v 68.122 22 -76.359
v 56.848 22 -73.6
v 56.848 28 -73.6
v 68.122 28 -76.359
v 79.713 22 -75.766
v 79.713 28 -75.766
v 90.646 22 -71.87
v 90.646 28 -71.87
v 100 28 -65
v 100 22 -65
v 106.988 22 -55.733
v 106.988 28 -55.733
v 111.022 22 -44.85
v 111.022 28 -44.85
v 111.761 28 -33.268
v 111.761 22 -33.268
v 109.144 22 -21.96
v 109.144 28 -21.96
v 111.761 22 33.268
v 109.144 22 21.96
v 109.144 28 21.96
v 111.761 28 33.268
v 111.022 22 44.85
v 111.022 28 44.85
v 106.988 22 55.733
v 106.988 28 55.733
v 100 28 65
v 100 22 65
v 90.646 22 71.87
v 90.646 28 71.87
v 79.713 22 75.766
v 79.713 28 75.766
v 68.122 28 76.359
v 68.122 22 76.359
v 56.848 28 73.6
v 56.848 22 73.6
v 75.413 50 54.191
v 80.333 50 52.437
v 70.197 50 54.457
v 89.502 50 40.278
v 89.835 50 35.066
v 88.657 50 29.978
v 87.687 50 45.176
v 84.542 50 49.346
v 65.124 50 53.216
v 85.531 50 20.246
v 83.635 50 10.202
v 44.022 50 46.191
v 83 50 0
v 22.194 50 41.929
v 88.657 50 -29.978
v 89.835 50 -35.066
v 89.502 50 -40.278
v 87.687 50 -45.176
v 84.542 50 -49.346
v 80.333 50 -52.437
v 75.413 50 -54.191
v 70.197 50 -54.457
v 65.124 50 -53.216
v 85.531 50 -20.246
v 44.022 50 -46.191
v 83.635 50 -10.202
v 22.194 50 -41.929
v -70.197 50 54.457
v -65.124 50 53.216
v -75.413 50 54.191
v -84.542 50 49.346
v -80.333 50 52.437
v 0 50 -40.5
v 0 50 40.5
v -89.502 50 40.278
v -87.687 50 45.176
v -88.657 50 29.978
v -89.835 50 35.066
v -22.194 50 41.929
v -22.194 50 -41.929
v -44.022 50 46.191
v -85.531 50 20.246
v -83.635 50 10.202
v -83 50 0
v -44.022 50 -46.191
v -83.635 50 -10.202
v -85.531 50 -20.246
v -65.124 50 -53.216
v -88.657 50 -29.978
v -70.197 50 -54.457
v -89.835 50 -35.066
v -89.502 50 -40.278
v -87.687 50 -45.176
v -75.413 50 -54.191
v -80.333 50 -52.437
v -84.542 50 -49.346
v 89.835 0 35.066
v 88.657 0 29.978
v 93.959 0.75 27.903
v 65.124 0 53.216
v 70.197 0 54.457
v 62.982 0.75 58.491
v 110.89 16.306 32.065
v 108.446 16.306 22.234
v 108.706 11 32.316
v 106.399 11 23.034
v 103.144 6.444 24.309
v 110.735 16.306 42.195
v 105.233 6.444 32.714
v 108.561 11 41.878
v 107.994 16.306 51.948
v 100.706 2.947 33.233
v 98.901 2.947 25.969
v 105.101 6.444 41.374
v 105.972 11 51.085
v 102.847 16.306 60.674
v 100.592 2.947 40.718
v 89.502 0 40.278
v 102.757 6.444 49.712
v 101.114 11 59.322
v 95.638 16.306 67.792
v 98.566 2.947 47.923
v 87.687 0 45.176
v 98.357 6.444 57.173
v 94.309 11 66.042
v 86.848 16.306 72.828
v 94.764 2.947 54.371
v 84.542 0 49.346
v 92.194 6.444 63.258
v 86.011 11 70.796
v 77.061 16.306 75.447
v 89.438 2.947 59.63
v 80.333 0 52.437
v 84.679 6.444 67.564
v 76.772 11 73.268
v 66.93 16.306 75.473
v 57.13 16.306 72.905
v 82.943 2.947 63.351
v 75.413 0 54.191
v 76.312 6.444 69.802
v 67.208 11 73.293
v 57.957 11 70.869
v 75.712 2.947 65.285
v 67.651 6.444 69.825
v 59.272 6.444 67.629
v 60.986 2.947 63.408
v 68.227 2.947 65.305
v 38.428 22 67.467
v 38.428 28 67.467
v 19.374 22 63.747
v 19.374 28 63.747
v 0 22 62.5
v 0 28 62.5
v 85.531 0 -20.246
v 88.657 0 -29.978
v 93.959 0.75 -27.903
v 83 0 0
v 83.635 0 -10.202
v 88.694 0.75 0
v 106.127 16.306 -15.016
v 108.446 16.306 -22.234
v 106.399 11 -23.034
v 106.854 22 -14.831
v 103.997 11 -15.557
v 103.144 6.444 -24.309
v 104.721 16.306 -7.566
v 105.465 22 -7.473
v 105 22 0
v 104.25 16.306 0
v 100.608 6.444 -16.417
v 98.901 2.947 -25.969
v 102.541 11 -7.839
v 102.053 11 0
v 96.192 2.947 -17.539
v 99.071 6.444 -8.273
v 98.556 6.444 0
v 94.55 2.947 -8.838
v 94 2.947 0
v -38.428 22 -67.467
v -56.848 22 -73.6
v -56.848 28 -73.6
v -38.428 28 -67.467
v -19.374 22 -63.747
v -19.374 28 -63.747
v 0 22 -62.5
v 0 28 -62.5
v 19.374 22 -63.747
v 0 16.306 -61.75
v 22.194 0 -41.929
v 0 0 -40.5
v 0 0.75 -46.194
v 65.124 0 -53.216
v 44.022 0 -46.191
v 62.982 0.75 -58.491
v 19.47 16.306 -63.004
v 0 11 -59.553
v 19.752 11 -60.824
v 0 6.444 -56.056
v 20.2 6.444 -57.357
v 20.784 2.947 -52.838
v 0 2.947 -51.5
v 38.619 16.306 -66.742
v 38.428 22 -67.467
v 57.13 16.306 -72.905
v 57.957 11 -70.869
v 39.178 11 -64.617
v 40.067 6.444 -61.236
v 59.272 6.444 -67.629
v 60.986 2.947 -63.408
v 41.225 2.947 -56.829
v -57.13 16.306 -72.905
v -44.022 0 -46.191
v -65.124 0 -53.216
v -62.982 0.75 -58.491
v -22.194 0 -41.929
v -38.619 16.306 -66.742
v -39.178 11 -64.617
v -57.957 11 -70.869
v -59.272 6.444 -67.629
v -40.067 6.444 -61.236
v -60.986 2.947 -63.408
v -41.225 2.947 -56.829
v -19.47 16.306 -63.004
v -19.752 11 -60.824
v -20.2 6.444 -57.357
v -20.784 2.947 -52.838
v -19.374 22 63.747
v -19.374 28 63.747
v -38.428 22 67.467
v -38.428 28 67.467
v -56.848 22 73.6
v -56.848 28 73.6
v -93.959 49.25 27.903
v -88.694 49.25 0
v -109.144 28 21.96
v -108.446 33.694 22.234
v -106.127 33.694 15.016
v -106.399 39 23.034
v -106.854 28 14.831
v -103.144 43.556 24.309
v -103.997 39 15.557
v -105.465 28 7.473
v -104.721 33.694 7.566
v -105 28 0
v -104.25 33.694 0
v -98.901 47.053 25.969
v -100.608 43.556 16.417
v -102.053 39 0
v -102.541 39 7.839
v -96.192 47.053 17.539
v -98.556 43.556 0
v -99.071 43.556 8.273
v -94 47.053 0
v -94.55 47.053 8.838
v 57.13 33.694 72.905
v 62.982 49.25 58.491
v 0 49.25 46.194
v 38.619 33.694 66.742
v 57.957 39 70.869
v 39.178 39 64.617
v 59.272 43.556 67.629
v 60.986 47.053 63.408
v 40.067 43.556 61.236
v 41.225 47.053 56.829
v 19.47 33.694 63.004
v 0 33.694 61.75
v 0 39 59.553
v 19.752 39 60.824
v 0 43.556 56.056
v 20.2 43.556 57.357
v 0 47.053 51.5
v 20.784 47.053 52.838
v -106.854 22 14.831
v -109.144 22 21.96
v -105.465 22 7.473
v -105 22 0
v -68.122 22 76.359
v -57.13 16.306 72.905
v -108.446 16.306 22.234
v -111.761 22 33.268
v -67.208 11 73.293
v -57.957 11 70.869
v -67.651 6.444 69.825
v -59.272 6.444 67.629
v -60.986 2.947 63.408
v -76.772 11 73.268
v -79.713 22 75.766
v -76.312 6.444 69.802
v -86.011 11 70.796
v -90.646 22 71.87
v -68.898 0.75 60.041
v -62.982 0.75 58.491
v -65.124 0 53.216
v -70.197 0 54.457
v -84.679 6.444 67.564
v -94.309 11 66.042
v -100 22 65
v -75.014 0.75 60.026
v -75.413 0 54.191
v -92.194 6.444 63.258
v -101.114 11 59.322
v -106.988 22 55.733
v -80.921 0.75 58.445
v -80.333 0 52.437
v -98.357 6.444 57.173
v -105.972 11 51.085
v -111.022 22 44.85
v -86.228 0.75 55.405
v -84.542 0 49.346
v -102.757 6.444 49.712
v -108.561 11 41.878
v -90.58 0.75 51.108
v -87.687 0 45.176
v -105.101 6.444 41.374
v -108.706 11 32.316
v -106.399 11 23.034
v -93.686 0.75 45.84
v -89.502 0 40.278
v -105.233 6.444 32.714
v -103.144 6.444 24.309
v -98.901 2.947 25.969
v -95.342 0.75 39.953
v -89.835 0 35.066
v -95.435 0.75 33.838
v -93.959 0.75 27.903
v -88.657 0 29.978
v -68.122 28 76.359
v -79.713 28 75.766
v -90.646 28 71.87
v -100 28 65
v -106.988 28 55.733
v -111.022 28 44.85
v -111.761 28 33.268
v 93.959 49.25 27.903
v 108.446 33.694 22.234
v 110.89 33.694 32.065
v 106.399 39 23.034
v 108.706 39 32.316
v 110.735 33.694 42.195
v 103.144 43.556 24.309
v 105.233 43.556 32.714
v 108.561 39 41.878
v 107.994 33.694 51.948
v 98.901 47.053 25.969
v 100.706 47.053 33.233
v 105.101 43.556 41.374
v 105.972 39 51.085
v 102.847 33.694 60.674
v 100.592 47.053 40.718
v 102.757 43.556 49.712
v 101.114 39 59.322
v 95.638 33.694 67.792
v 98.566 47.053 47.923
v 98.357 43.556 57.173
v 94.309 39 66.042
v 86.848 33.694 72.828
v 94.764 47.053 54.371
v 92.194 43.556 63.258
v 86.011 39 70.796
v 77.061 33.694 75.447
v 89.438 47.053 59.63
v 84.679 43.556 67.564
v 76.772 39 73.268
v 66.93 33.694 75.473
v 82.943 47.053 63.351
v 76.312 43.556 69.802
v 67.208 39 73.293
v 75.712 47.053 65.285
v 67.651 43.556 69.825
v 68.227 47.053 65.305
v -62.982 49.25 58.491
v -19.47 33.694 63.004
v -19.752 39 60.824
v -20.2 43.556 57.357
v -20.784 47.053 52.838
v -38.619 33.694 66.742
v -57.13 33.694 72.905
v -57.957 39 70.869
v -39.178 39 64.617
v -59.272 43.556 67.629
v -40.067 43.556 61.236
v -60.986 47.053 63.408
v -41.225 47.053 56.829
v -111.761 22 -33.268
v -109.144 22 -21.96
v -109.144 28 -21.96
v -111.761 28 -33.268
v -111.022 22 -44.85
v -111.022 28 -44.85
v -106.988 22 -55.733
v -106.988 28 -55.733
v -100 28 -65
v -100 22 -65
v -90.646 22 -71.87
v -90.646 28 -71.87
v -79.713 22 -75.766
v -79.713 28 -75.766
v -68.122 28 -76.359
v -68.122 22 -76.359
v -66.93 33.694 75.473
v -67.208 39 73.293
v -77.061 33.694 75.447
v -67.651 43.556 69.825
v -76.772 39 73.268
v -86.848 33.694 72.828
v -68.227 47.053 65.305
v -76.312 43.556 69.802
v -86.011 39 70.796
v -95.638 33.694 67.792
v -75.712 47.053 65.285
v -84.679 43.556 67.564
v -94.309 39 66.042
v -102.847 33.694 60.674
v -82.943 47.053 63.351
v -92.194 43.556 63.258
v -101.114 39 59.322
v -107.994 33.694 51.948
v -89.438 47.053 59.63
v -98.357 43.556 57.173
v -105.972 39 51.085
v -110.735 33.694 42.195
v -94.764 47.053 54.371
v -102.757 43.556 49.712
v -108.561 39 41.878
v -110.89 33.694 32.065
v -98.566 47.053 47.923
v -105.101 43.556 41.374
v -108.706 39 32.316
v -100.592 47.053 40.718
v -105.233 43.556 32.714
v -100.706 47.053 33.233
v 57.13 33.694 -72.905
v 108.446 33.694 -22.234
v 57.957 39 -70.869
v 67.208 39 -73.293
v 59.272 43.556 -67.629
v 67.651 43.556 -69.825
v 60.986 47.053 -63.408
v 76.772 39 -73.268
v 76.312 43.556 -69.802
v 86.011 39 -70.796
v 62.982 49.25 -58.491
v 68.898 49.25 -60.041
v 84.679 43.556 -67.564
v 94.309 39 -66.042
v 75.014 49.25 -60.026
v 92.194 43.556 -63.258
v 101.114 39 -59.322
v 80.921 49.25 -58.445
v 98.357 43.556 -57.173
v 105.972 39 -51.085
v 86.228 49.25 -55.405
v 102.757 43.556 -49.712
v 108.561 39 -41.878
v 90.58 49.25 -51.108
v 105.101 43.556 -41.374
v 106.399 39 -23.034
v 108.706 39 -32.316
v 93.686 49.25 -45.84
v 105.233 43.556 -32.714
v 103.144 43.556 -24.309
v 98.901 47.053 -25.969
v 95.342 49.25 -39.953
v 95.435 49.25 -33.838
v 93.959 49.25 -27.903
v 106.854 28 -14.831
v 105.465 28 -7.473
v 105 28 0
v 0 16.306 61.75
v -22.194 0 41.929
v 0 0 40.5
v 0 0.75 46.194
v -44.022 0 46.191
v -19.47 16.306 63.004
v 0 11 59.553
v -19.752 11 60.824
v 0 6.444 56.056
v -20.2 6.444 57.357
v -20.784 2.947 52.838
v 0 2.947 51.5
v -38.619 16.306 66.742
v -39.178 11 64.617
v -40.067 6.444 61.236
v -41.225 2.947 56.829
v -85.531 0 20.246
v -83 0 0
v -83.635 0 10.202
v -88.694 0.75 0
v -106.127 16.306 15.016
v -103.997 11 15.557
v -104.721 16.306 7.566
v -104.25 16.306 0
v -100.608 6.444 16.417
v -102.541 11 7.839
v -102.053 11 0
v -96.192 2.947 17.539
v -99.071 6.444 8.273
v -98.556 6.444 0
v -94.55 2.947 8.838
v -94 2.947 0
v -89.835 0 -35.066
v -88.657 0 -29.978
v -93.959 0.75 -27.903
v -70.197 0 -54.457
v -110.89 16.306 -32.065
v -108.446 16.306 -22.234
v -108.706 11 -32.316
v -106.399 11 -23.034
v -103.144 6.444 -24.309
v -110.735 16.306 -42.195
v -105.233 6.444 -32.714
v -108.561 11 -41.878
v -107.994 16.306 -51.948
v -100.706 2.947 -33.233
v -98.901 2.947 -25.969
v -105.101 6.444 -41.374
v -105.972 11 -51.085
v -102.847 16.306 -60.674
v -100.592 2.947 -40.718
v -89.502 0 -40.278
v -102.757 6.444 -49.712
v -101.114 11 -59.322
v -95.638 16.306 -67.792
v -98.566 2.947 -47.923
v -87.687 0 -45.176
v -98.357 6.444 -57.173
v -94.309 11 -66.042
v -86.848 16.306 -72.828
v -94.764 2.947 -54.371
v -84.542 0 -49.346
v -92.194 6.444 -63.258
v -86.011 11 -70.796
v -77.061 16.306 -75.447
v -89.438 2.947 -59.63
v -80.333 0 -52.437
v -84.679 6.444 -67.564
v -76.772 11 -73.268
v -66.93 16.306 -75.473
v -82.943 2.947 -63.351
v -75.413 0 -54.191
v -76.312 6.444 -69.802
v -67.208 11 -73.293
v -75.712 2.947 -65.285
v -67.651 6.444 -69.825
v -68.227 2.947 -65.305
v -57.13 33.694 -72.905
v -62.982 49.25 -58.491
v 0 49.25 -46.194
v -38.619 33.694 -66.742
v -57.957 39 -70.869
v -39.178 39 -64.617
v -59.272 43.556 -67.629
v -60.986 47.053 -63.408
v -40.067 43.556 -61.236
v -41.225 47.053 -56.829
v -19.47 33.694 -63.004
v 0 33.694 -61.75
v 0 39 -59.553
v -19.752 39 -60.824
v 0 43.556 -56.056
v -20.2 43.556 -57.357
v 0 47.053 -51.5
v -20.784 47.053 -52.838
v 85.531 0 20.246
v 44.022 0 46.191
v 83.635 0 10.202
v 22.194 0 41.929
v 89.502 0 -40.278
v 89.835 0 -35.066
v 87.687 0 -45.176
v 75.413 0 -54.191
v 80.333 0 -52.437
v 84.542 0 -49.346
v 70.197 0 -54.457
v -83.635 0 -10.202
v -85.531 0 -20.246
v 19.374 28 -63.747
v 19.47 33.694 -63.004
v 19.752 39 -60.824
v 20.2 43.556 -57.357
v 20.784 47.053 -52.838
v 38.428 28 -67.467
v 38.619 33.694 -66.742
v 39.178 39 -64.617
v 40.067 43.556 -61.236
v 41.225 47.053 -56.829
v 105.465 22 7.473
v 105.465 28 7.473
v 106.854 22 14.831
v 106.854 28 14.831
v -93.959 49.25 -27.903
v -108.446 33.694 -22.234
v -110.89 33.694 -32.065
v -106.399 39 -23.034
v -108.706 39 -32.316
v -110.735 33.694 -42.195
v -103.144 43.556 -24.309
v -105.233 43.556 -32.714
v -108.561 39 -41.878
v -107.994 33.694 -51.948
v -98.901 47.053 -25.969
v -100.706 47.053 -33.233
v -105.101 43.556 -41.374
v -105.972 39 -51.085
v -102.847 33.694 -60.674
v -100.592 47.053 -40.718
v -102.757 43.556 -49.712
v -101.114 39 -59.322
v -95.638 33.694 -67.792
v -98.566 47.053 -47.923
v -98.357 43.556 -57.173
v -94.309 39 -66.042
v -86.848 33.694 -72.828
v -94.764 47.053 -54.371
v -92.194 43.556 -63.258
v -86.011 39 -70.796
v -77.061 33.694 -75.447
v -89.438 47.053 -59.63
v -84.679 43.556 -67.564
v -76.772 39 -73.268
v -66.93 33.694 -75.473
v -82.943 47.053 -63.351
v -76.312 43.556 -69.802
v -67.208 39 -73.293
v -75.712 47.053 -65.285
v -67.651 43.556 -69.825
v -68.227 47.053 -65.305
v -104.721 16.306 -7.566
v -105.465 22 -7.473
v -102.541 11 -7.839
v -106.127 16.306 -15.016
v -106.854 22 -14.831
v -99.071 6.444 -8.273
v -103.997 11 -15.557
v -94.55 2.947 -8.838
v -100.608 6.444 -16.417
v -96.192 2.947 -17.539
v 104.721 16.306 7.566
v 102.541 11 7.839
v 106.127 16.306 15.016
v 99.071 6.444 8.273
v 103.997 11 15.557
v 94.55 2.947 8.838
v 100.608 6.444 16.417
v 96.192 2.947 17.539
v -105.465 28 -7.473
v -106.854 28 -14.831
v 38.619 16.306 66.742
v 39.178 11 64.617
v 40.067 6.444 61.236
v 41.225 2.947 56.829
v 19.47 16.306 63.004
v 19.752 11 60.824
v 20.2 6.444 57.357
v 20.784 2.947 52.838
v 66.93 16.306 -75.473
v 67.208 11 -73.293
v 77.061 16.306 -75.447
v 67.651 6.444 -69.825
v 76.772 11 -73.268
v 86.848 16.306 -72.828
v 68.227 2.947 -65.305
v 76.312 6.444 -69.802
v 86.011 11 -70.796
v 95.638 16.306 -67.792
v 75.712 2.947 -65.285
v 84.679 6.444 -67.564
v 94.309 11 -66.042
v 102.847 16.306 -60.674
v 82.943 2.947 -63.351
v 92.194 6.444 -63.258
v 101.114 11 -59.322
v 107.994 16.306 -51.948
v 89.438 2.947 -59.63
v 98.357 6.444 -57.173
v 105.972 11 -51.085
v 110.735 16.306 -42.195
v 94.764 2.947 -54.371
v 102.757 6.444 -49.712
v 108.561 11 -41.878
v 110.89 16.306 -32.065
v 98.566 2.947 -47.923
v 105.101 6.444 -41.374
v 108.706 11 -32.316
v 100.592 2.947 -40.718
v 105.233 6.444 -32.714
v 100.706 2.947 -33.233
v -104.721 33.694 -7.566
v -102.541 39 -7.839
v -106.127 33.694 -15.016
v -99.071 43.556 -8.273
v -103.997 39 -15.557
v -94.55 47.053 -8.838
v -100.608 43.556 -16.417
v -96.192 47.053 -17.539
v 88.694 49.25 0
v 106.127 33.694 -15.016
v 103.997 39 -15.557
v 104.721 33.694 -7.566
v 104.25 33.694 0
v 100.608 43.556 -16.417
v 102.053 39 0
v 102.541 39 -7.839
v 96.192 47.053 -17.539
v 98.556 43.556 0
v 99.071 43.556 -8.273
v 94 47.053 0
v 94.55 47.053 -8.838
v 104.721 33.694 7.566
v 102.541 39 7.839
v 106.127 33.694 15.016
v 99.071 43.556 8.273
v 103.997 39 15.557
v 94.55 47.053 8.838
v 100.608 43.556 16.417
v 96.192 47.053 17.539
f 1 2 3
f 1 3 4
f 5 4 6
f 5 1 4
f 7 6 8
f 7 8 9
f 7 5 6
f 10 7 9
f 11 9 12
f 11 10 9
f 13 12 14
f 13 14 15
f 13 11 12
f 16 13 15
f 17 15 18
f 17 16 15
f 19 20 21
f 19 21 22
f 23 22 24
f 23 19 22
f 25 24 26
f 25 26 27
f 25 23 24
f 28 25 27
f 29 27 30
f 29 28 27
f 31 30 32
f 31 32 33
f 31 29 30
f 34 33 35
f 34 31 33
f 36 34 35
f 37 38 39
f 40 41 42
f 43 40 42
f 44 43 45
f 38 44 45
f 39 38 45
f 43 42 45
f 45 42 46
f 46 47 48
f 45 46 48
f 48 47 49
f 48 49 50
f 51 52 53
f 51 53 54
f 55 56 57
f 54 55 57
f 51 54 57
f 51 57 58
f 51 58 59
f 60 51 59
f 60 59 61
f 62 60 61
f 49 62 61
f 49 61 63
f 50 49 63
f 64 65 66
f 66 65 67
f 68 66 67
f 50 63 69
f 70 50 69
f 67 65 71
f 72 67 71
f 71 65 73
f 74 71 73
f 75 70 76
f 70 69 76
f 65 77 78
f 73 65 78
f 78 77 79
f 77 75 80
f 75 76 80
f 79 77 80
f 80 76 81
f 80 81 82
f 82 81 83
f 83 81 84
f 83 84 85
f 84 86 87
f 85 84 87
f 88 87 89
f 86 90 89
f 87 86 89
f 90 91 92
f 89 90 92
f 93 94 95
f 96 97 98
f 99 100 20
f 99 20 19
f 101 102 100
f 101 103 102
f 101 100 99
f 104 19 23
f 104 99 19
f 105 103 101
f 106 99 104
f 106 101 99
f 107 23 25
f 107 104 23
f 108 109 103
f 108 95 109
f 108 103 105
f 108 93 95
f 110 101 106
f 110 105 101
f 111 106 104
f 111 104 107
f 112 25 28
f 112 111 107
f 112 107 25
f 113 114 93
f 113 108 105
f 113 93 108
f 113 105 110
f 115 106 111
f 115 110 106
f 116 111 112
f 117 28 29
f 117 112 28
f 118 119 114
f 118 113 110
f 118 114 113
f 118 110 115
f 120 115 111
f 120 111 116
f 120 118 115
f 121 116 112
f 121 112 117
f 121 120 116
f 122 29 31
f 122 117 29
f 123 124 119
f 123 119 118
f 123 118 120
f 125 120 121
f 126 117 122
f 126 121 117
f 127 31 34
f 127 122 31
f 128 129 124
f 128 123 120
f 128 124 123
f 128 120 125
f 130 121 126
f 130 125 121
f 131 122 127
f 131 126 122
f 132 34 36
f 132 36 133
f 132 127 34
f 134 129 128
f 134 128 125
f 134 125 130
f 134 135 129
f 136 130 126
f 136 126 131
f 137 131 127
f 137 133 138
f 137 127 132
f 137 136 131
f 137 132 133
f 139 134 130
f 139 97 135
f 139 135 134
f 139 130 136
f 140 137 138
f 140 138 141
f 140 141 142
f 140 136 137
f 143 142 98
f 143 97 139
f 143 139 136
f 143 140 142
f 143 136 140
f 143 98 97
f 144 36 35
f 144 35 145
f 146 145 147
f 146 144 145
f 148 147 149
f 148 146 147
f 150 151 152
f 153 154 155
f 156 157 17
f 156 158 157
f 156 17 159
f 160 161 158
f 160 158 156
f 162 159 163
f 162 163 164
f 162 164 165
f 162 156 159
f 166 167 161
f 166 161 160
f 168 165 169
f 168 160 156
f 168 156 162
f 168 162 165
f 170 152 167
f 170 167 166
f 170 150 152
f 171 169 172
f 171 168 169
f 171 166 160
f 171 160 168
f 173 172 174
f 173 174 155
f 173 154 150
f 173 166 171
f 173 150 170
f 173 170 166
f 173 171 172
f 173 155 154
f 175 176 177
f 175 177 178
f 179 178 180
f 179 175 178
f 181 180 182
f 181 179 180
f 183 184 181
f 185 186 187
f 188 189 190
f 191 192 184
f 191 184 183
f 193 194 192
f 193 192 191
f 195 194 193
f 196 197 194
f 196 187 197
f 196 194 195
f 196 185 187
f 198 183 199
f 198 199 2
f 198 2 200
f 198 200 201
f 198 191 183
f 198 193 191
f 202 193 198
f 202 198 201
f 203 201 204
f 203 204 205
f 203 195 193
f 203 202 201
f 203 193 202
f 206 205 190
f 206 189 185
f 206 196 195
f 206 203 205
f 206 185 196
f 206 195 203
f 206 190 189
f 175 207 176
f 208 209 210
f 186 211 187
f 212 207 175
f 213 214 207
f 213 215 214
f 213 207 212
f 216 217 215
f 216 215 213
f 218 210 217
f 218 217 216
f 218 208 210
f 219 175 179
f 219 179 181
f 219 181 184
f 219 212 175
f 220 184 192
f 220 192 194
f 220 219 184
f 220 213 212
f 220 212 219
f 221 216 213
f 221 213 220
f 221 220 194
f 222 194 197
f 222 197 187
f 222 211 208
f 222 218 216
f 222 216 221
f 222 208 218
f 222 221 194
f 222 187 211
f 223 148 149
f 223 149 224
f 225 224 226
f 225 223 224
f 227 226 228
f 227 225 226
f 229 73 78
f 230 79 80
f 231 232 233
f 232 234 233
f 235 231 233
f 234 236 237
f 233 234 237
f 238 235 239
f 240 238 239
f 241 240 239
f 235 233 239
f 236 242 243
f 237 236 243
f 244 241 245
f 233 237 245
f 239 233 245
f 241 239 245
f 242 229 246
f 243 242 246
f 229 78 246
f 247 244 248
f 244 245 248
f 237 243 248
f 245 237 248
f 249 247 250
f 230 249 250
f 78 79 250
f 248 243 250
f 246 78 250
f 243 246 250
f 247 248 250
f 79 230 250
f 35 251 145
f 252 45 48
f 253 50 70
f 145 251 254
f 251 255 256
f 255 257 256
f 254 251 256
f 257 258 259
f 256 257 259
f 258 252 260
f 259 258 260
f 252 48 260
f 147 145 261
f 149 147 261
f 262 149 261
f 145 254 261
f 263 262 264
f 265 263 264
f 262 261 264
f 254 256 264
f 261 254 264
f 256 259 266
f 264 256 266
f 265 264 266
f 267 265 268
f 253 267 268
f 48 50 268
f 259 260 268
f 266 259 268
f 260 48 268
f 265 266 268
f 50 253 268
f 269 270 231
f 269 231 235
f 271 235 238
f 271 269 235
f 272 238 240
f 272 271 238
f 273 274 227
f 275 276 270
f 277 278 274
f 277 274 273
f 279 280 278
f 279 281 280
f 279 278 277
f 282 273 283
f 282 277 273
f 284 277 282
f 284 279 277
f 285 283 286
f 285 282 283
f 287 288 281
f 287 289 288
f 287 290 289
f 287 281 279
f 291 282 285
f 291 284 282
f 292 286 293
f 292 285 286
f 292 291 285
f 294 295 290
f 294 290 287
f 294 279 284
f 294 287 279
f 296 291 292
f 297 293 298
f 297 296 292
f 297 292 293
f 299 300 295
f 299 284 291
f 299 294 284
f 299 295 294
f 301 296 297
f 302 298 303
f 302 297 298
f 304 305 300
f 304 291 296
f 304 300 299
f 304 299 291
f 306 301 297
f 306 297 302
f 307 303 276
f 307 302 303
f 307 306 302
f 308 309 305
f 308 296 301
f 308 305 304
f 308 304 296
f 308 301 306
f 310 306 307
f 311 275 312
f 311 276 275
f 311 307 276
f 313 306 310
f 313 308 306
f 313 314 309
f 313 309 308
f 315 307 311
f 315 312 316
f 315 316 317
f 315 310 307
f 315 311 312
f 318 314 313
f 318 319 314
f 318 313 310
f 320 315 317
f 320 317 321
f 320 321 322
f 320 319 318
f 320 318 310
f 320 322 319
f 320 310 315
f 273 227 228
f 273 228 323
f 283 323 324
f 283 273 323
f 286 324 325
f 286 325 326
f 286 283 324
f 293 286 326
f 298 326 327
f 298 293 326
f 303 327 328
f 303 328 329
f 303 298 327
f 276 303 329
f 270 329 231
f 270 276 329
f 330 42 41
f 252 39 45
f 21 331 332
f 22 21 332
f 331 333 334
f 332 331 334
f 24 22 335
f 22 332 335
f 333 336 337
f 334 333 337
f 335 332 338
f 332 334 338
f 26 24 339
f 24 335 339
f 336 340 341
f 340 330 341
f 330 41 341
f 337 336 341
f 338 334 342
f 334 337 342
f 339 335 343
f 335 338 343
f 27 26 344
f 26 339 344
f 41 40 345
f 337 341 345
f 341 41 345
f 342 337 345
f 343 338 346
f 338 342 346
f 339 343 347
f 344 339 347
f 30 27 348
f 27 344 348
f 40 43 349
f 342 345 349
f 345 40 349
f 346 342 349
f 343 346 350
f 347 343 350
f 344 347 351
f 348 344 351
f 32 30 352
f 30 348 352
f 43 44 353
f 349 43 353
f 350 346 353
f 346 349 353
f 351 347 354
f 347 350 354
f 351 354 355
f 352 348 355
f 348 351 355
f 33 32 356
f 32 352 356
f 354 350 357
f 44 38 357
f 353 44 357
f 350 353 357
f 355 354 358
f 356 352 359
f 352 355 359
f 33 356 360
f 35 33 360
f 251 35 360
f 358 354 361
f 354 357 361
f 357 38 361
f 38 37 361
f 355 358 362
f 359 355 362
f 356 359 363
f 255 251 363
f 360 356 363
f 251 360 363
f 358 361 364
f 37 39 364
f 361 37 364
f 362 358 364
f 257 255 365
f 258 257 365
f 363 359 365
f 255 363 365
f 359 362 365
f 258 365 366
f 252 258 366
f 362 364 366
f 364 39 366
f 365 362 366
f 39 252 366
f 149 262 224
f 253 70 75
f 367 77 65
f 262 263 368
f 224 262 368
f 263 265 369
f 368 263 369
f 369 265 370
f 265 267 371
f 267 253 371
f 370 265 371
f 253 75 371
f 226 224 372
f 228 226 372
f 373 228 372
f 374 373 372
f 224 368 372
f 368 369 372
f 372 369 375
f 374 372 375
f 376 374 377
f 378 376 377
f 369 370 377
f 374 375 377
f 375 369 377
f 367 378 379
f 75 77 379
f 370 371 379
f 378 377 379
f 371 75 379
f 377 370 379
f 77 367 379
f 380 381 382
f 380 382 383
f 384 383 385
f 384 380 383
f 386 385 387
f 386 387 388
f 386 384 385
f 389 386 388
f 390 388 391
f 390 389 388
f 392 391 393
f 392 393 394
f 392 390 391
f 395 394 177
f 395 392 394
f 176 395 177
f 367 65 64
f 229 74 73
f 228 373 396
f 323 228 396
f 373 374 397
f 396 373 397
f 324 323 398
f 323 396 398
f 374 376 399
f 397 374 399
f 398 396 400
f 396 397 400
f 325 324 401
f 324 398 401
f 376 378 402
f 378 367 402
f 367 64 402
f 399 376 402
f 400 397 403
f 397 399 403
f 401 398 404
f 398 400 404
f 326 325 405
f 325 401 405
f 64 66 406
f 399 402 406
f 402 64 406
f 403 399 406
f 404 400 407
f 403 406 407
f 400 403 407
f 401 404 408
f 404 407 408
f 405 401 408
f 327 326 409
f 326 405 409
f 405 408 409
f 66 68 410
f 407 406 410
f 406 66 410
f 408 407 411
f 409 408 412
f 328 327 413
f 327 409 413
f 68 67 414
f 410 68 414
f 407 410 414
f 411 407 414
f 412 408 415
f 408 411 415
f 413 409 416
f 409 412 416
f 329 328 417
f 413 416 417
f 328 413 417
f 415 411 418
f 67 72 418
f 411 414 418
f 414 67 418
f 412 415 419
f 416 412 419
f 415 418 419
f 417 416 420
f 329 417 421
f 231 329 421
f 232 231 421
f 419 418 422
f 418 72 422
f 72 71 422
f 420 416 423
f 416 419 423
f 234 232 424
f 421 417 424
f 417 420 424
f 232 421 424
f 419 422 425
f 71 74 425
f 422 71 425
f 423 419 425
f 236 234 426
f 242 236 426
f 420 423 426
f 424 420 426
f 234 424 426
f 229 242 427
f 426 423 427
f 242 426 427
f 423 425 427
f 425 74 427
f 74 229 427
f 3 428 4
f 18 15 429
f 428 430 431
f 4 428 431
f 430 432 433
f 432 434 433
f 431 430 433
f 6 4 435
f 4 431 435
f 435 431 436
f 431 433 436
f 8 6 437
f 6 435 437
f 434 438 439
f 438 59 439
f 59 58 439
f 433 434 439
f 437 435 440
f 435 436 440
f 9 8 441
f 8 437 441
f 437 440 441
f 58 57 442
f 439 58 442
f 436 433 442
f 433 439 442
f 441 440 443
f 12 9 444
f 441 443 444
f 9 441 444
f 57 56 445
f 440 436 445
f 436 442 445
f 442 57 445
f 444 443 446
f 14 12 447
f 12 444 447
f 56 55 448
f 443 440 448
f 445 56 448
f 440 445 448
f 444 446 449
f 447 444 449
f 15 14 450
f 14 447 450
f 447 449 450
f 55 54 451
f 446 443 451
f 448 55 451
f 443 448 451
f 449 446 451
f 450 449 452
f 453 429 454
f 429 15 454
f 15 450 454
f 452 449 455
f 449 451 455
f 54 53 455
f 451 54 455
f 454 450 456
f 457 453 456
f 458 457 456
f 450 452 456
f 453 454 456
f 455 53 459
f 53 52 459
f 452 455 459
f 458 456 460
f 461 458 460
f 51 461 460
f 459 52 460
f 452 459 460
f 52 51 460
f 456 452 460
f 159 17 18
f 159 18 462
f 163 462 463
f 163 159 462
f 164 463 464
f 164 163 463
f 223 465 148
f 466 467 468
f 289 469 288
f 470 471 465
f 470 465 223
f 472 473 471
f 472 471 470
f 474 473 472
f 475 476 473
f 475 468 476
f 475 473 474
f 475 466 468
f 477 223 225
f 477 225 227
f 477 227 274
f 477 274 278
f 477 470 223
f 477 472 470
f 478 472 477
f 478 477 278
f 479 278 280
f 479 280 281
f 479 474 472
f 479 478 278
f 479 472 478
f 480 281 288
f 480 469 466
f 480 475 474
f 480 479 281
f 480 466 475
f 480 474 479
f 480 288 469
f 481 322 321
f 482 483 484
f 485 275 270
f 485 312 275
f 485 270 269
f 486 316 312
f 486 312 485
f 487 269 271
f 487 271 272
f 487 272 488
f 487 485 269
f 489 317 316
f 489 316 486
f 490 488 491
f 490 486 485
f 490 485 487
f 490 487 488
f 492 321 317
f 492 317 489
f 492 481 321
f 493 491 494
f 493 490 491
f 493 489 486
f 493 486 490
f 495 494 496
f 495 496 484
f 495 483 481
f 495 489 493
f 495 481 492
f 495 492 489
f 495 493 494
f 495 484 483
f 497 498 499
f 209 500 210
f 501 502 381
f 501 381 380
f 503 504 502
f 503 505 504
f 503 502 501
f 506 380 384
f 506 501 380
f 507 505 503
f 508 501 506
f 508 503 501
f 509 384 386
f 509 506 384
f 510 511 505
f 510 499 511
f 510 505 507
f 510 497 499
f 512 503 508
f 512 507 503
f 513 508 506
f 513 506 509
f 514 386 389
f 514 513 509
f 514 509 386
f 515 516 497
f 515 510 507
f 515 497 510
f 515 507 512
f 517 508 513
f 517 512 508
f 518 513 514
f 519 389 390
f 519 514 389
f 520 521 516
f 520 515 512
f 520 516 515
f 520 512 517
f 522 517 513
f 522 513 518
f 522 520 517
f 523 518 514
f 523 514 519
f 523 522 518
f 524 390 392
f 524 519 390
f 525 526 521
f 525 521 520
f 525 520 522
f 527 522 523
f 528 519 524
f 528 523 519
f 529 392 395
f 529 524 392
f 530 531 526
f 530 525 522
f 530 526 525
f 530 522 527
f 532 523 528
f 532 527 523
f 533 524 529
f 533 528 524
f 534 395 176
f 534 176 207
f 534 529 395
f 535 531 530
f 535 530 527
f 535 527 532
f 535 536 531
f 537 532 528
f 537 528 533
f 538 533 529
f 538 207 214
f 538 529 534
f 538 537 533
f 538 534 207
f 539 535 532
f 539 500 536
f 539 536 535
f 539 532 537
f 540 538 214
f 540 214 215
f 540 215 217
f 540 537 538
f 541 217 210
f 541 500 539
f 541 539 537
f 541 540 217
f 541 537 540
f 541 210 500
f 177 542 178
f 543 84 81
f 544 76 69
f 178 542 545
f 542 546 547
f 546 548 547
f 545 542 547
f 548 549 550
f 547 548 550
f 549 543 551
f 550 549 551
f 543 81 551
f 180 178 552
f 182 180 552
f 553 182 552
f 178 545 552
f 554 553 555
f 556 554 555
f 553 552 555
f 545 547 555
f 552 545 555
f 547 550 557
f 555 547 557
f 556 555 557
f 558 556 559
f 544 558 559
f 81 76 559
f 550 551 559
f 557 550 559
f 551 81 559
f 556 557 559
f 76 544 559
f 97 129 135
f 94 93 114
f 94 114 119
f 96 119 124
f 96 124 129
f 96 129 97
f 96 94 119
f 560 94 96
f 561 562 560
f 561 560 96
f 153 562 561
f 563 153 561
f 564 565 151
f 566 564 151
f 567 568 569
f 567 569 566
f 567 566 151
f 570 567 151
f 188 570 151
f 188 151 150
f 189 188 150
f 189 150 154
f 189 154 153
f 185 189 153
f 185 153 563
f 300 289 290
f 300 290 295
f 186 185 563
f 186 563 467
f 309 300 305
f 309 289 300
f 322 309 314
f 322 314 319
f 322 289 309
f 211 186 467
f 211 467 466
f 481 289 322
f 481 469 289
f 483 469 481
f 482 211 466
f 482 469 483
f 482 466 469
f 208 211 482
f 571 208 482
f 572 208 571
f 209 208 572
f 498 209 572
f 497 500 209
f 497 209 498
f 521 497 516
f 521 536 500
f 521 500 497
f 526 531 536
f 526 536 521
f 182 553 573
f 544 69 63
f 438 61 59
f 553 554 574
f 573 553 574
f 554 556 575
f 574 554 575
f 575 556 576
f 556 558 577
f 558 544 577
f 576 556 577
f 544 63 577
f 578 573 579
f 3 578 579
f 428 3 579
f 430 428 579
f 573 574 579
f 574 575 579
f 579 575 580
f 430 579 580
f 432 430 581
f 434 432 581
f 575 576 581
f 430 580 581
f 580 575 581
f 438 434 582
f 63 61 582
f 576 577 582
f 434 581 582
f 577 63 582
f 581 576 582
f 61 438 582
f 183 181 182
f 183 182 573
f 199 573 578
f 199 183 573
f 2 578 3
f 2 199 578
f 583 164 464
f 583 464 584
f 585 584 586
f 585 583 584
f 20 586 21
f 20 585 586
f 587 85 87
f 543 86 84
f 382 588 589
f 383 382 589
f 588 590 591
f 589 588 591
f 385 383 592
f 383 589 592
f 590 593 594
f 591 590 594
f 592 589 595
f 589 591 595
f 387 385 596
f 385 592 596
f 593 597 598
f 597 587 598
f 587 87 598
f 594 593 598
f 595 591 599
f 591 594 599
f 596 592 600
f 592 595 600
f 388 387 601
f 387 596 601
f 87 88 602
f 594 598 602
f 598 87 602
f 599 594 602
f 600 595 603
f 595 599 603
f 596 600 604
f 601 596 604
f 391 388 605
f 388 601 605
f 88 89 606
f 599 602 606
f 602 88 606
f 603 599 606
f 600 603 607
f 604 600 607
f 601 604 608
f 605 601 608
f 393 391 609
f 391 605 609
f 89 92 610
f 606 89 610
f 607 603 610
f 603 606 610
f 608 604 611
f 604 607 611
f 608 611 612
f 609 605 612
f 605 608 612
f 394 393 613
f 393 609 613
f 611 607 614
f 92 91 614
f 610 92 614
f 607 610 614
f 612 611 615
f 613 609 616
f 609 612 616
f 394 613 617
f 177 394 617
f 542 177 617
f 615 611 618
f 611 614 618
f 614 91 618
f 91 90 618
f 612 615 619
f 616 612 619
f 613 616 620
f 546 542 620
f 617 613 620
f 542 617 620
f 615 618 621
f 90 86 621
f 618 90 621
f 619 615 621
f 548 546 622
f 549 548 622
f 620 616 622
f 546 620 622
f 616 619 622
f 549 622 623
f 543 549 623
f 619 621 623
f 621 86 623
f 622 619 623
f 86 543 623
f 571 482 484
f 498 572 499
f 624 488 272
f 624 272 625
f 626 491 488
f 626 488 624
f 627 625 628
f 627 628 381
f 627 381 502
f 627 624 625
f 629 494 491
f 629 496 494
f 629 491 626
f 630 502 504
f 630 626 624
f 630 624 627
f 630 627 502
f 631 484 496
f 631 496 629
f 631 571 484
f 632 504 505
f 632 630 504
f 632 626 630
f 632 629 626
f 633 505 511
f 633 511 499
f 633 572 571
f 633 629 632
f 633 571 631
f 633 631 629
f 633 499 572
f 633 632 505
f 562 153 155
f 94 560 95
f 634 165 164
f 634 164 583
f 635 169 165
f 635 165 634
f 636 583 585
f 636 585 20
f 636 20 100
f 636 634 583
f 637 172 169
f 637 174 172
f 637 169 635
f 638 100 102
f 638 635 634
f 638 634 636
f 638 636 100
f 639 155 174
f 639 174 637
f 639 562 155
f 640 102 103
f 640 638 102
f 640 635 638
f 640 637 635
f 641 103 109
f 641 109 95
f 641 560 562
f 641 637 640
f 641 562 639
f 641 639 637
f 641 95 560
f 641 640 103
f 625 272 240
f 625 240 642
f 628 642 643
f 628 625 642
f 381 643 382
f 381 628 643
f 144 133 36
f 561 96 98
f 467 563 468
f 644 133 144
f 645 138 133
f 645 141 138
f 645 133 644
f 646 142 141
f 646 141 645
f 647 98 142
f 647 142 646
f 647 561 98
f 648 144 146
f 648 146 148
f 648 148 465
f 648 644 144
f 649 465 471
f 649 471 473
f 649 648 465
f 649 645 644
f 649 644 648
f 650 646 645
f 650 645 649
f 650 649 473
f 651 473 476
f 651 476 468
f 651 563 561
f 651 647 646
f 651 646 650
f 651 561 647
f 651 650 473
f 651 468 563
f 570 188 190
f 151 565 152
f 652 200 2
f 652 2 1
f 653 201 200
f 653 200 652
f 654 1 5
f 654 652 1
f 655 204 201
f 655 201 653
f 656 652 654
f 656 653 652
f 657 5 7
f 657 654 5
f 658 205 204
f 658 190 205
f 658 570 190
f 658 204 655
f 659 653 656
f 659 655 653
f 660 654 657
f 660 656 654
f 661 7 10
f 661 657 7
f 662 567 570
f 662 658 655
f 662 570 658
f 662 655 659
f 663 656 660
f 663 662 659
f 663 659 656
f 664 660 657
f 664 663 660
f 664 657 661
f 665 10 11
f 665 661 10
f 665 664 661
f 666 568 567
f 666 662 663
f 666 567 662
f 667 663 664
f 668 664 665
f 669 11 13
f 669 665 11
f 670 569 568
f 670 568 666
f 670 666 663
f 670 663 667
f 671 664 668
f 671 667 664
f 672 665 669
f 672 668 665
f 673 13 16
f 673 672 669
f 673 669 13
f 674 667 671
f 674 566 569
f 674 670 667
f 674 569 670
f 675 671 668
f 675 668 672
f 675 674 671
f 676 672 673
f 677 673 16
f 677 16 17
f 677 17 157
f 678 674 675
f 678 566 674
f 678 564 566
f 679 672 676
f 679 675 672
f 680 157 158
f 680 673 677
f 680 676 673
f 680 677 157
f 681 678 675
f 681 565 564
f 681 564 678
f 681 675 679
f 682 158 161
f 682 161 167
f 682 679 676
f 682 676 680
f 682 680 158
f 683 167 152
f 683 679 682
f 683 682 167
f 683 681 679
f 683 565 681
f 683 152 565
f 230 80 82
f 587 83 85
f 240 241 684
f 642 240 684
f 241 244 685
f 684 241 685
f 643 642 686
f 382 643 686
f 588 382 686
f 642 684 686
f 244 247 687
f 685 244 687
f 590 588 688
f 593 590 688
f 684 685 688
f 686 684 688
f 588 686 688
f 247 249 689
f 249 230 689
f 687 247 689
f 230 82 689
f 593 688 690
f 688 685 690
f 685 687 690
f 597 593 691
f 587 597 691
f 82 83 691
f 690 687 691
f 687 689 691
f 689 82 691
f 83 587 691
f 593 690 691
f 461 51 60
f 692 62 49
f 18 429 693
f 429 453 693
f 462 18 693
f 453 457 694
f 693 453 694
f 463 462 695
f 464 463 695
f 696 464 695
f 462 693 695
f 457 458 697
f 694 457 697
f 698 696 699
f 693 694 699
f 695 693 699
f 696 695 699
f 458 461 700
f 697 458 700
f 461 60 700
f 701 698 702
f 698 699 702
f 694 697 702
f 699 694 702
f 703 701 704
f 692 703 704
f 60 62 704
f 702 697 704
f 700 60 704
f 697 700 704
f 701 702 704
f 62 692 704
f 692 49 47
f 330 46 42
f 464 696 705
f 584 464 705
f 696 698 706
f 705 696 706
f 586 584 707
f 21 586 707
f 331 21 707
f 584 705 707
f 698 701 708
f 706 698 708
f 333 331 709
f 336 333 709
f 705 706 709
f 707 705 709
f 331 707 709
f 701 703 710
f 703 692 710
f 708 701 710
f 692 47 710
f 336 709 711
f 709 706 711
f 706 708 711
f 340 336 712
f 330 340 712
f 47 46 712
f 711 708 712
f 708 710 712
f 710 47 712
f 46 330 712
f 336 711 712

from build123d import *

# Parameters (mm, degrees)
BOSS_EXTRUDE1_DEPTH = 50
FILLET1_R           = 22


with BuildPart() as part:
    # Sketch1 → Boss-Extrude1 (new body)
    with BuildSketch(Plane(origin=(0, 0, 0), x_dir=(1, 0, 0), z_dir=(0, 1, 0))):
        with BuildLine():
            ThreePointArc((-56.848272026, 73.599801144), (-28.960885768, 65.300905733), (0, 62.5))
            ThreePointArc((0, 62.5), (28.960885768, 65.300905733), (56.848272026, 73.599801144))
            ThreePointArc((56.848272026, 73.599801144), (100, 65), (109.144044644, 21.960313031))
            ThreePointArc((109.144044644, 21.960313031), (106.045073596, 11.173947987), (105, 0))
            ThreePointArc((105, 0), (106.045073596, -11.173947987), (109.144044644, -21.960313031))
            ThreePointArc((109.144044644, -21.960313031), (100, -65), (56.848272026, -73.599801144))
            ThreePointArc((56.848272026, -73.599801144), (28.960885768, -65.300905733), (0, -62.5))
            ThreePointArc((0, -62.5), (-28.960885768, -65.300905733), (-56.848272026, -73.599801144))
            ThreePointArc((-56.848272026, -73.599801144), (-100, -65), (-109.144044644, -21.960313031))
            ThreePointArc((-109.144044644, -21.960313031), (-106.045073596, -11.173947987), (-105, 0))
            ThreePointArc((-105, 0), (-106.045073596, 11.173947987), (-109.144044644, 21.960313031))
            ThreePointArc((-109.144044644, 21.960313031), (-100, 65), (-56.848272026, 73.599801144))
        make_face()
    extrude(amount=BOSS_EXTRUDE1_DEPTH)

    # Fillet1
    fillet1_edges = [part.edges().sort_by_distance(p)[0] for p in [
        (0, 0, 62.5),
        (-100, 0, 65),
        (105, 50, 0),
        (-105, 0, 0),
        (-100, 0, -65),
        (0, 0, -62.5),
        (100, 0, -65),
        (105, 0, 0),
        (100, 0, 65),
        (100, 50, -65),
        (0, 50, -62.5),
        (-100, 50, -65),
        (-105, 50, 0),
        (-100, 50, 65),
        (0, 50, 62.5),
        (100, 50, 65),
    ]]
    fillet(fillet1_edges, radius=FILLET1_R)


solid = part.part
